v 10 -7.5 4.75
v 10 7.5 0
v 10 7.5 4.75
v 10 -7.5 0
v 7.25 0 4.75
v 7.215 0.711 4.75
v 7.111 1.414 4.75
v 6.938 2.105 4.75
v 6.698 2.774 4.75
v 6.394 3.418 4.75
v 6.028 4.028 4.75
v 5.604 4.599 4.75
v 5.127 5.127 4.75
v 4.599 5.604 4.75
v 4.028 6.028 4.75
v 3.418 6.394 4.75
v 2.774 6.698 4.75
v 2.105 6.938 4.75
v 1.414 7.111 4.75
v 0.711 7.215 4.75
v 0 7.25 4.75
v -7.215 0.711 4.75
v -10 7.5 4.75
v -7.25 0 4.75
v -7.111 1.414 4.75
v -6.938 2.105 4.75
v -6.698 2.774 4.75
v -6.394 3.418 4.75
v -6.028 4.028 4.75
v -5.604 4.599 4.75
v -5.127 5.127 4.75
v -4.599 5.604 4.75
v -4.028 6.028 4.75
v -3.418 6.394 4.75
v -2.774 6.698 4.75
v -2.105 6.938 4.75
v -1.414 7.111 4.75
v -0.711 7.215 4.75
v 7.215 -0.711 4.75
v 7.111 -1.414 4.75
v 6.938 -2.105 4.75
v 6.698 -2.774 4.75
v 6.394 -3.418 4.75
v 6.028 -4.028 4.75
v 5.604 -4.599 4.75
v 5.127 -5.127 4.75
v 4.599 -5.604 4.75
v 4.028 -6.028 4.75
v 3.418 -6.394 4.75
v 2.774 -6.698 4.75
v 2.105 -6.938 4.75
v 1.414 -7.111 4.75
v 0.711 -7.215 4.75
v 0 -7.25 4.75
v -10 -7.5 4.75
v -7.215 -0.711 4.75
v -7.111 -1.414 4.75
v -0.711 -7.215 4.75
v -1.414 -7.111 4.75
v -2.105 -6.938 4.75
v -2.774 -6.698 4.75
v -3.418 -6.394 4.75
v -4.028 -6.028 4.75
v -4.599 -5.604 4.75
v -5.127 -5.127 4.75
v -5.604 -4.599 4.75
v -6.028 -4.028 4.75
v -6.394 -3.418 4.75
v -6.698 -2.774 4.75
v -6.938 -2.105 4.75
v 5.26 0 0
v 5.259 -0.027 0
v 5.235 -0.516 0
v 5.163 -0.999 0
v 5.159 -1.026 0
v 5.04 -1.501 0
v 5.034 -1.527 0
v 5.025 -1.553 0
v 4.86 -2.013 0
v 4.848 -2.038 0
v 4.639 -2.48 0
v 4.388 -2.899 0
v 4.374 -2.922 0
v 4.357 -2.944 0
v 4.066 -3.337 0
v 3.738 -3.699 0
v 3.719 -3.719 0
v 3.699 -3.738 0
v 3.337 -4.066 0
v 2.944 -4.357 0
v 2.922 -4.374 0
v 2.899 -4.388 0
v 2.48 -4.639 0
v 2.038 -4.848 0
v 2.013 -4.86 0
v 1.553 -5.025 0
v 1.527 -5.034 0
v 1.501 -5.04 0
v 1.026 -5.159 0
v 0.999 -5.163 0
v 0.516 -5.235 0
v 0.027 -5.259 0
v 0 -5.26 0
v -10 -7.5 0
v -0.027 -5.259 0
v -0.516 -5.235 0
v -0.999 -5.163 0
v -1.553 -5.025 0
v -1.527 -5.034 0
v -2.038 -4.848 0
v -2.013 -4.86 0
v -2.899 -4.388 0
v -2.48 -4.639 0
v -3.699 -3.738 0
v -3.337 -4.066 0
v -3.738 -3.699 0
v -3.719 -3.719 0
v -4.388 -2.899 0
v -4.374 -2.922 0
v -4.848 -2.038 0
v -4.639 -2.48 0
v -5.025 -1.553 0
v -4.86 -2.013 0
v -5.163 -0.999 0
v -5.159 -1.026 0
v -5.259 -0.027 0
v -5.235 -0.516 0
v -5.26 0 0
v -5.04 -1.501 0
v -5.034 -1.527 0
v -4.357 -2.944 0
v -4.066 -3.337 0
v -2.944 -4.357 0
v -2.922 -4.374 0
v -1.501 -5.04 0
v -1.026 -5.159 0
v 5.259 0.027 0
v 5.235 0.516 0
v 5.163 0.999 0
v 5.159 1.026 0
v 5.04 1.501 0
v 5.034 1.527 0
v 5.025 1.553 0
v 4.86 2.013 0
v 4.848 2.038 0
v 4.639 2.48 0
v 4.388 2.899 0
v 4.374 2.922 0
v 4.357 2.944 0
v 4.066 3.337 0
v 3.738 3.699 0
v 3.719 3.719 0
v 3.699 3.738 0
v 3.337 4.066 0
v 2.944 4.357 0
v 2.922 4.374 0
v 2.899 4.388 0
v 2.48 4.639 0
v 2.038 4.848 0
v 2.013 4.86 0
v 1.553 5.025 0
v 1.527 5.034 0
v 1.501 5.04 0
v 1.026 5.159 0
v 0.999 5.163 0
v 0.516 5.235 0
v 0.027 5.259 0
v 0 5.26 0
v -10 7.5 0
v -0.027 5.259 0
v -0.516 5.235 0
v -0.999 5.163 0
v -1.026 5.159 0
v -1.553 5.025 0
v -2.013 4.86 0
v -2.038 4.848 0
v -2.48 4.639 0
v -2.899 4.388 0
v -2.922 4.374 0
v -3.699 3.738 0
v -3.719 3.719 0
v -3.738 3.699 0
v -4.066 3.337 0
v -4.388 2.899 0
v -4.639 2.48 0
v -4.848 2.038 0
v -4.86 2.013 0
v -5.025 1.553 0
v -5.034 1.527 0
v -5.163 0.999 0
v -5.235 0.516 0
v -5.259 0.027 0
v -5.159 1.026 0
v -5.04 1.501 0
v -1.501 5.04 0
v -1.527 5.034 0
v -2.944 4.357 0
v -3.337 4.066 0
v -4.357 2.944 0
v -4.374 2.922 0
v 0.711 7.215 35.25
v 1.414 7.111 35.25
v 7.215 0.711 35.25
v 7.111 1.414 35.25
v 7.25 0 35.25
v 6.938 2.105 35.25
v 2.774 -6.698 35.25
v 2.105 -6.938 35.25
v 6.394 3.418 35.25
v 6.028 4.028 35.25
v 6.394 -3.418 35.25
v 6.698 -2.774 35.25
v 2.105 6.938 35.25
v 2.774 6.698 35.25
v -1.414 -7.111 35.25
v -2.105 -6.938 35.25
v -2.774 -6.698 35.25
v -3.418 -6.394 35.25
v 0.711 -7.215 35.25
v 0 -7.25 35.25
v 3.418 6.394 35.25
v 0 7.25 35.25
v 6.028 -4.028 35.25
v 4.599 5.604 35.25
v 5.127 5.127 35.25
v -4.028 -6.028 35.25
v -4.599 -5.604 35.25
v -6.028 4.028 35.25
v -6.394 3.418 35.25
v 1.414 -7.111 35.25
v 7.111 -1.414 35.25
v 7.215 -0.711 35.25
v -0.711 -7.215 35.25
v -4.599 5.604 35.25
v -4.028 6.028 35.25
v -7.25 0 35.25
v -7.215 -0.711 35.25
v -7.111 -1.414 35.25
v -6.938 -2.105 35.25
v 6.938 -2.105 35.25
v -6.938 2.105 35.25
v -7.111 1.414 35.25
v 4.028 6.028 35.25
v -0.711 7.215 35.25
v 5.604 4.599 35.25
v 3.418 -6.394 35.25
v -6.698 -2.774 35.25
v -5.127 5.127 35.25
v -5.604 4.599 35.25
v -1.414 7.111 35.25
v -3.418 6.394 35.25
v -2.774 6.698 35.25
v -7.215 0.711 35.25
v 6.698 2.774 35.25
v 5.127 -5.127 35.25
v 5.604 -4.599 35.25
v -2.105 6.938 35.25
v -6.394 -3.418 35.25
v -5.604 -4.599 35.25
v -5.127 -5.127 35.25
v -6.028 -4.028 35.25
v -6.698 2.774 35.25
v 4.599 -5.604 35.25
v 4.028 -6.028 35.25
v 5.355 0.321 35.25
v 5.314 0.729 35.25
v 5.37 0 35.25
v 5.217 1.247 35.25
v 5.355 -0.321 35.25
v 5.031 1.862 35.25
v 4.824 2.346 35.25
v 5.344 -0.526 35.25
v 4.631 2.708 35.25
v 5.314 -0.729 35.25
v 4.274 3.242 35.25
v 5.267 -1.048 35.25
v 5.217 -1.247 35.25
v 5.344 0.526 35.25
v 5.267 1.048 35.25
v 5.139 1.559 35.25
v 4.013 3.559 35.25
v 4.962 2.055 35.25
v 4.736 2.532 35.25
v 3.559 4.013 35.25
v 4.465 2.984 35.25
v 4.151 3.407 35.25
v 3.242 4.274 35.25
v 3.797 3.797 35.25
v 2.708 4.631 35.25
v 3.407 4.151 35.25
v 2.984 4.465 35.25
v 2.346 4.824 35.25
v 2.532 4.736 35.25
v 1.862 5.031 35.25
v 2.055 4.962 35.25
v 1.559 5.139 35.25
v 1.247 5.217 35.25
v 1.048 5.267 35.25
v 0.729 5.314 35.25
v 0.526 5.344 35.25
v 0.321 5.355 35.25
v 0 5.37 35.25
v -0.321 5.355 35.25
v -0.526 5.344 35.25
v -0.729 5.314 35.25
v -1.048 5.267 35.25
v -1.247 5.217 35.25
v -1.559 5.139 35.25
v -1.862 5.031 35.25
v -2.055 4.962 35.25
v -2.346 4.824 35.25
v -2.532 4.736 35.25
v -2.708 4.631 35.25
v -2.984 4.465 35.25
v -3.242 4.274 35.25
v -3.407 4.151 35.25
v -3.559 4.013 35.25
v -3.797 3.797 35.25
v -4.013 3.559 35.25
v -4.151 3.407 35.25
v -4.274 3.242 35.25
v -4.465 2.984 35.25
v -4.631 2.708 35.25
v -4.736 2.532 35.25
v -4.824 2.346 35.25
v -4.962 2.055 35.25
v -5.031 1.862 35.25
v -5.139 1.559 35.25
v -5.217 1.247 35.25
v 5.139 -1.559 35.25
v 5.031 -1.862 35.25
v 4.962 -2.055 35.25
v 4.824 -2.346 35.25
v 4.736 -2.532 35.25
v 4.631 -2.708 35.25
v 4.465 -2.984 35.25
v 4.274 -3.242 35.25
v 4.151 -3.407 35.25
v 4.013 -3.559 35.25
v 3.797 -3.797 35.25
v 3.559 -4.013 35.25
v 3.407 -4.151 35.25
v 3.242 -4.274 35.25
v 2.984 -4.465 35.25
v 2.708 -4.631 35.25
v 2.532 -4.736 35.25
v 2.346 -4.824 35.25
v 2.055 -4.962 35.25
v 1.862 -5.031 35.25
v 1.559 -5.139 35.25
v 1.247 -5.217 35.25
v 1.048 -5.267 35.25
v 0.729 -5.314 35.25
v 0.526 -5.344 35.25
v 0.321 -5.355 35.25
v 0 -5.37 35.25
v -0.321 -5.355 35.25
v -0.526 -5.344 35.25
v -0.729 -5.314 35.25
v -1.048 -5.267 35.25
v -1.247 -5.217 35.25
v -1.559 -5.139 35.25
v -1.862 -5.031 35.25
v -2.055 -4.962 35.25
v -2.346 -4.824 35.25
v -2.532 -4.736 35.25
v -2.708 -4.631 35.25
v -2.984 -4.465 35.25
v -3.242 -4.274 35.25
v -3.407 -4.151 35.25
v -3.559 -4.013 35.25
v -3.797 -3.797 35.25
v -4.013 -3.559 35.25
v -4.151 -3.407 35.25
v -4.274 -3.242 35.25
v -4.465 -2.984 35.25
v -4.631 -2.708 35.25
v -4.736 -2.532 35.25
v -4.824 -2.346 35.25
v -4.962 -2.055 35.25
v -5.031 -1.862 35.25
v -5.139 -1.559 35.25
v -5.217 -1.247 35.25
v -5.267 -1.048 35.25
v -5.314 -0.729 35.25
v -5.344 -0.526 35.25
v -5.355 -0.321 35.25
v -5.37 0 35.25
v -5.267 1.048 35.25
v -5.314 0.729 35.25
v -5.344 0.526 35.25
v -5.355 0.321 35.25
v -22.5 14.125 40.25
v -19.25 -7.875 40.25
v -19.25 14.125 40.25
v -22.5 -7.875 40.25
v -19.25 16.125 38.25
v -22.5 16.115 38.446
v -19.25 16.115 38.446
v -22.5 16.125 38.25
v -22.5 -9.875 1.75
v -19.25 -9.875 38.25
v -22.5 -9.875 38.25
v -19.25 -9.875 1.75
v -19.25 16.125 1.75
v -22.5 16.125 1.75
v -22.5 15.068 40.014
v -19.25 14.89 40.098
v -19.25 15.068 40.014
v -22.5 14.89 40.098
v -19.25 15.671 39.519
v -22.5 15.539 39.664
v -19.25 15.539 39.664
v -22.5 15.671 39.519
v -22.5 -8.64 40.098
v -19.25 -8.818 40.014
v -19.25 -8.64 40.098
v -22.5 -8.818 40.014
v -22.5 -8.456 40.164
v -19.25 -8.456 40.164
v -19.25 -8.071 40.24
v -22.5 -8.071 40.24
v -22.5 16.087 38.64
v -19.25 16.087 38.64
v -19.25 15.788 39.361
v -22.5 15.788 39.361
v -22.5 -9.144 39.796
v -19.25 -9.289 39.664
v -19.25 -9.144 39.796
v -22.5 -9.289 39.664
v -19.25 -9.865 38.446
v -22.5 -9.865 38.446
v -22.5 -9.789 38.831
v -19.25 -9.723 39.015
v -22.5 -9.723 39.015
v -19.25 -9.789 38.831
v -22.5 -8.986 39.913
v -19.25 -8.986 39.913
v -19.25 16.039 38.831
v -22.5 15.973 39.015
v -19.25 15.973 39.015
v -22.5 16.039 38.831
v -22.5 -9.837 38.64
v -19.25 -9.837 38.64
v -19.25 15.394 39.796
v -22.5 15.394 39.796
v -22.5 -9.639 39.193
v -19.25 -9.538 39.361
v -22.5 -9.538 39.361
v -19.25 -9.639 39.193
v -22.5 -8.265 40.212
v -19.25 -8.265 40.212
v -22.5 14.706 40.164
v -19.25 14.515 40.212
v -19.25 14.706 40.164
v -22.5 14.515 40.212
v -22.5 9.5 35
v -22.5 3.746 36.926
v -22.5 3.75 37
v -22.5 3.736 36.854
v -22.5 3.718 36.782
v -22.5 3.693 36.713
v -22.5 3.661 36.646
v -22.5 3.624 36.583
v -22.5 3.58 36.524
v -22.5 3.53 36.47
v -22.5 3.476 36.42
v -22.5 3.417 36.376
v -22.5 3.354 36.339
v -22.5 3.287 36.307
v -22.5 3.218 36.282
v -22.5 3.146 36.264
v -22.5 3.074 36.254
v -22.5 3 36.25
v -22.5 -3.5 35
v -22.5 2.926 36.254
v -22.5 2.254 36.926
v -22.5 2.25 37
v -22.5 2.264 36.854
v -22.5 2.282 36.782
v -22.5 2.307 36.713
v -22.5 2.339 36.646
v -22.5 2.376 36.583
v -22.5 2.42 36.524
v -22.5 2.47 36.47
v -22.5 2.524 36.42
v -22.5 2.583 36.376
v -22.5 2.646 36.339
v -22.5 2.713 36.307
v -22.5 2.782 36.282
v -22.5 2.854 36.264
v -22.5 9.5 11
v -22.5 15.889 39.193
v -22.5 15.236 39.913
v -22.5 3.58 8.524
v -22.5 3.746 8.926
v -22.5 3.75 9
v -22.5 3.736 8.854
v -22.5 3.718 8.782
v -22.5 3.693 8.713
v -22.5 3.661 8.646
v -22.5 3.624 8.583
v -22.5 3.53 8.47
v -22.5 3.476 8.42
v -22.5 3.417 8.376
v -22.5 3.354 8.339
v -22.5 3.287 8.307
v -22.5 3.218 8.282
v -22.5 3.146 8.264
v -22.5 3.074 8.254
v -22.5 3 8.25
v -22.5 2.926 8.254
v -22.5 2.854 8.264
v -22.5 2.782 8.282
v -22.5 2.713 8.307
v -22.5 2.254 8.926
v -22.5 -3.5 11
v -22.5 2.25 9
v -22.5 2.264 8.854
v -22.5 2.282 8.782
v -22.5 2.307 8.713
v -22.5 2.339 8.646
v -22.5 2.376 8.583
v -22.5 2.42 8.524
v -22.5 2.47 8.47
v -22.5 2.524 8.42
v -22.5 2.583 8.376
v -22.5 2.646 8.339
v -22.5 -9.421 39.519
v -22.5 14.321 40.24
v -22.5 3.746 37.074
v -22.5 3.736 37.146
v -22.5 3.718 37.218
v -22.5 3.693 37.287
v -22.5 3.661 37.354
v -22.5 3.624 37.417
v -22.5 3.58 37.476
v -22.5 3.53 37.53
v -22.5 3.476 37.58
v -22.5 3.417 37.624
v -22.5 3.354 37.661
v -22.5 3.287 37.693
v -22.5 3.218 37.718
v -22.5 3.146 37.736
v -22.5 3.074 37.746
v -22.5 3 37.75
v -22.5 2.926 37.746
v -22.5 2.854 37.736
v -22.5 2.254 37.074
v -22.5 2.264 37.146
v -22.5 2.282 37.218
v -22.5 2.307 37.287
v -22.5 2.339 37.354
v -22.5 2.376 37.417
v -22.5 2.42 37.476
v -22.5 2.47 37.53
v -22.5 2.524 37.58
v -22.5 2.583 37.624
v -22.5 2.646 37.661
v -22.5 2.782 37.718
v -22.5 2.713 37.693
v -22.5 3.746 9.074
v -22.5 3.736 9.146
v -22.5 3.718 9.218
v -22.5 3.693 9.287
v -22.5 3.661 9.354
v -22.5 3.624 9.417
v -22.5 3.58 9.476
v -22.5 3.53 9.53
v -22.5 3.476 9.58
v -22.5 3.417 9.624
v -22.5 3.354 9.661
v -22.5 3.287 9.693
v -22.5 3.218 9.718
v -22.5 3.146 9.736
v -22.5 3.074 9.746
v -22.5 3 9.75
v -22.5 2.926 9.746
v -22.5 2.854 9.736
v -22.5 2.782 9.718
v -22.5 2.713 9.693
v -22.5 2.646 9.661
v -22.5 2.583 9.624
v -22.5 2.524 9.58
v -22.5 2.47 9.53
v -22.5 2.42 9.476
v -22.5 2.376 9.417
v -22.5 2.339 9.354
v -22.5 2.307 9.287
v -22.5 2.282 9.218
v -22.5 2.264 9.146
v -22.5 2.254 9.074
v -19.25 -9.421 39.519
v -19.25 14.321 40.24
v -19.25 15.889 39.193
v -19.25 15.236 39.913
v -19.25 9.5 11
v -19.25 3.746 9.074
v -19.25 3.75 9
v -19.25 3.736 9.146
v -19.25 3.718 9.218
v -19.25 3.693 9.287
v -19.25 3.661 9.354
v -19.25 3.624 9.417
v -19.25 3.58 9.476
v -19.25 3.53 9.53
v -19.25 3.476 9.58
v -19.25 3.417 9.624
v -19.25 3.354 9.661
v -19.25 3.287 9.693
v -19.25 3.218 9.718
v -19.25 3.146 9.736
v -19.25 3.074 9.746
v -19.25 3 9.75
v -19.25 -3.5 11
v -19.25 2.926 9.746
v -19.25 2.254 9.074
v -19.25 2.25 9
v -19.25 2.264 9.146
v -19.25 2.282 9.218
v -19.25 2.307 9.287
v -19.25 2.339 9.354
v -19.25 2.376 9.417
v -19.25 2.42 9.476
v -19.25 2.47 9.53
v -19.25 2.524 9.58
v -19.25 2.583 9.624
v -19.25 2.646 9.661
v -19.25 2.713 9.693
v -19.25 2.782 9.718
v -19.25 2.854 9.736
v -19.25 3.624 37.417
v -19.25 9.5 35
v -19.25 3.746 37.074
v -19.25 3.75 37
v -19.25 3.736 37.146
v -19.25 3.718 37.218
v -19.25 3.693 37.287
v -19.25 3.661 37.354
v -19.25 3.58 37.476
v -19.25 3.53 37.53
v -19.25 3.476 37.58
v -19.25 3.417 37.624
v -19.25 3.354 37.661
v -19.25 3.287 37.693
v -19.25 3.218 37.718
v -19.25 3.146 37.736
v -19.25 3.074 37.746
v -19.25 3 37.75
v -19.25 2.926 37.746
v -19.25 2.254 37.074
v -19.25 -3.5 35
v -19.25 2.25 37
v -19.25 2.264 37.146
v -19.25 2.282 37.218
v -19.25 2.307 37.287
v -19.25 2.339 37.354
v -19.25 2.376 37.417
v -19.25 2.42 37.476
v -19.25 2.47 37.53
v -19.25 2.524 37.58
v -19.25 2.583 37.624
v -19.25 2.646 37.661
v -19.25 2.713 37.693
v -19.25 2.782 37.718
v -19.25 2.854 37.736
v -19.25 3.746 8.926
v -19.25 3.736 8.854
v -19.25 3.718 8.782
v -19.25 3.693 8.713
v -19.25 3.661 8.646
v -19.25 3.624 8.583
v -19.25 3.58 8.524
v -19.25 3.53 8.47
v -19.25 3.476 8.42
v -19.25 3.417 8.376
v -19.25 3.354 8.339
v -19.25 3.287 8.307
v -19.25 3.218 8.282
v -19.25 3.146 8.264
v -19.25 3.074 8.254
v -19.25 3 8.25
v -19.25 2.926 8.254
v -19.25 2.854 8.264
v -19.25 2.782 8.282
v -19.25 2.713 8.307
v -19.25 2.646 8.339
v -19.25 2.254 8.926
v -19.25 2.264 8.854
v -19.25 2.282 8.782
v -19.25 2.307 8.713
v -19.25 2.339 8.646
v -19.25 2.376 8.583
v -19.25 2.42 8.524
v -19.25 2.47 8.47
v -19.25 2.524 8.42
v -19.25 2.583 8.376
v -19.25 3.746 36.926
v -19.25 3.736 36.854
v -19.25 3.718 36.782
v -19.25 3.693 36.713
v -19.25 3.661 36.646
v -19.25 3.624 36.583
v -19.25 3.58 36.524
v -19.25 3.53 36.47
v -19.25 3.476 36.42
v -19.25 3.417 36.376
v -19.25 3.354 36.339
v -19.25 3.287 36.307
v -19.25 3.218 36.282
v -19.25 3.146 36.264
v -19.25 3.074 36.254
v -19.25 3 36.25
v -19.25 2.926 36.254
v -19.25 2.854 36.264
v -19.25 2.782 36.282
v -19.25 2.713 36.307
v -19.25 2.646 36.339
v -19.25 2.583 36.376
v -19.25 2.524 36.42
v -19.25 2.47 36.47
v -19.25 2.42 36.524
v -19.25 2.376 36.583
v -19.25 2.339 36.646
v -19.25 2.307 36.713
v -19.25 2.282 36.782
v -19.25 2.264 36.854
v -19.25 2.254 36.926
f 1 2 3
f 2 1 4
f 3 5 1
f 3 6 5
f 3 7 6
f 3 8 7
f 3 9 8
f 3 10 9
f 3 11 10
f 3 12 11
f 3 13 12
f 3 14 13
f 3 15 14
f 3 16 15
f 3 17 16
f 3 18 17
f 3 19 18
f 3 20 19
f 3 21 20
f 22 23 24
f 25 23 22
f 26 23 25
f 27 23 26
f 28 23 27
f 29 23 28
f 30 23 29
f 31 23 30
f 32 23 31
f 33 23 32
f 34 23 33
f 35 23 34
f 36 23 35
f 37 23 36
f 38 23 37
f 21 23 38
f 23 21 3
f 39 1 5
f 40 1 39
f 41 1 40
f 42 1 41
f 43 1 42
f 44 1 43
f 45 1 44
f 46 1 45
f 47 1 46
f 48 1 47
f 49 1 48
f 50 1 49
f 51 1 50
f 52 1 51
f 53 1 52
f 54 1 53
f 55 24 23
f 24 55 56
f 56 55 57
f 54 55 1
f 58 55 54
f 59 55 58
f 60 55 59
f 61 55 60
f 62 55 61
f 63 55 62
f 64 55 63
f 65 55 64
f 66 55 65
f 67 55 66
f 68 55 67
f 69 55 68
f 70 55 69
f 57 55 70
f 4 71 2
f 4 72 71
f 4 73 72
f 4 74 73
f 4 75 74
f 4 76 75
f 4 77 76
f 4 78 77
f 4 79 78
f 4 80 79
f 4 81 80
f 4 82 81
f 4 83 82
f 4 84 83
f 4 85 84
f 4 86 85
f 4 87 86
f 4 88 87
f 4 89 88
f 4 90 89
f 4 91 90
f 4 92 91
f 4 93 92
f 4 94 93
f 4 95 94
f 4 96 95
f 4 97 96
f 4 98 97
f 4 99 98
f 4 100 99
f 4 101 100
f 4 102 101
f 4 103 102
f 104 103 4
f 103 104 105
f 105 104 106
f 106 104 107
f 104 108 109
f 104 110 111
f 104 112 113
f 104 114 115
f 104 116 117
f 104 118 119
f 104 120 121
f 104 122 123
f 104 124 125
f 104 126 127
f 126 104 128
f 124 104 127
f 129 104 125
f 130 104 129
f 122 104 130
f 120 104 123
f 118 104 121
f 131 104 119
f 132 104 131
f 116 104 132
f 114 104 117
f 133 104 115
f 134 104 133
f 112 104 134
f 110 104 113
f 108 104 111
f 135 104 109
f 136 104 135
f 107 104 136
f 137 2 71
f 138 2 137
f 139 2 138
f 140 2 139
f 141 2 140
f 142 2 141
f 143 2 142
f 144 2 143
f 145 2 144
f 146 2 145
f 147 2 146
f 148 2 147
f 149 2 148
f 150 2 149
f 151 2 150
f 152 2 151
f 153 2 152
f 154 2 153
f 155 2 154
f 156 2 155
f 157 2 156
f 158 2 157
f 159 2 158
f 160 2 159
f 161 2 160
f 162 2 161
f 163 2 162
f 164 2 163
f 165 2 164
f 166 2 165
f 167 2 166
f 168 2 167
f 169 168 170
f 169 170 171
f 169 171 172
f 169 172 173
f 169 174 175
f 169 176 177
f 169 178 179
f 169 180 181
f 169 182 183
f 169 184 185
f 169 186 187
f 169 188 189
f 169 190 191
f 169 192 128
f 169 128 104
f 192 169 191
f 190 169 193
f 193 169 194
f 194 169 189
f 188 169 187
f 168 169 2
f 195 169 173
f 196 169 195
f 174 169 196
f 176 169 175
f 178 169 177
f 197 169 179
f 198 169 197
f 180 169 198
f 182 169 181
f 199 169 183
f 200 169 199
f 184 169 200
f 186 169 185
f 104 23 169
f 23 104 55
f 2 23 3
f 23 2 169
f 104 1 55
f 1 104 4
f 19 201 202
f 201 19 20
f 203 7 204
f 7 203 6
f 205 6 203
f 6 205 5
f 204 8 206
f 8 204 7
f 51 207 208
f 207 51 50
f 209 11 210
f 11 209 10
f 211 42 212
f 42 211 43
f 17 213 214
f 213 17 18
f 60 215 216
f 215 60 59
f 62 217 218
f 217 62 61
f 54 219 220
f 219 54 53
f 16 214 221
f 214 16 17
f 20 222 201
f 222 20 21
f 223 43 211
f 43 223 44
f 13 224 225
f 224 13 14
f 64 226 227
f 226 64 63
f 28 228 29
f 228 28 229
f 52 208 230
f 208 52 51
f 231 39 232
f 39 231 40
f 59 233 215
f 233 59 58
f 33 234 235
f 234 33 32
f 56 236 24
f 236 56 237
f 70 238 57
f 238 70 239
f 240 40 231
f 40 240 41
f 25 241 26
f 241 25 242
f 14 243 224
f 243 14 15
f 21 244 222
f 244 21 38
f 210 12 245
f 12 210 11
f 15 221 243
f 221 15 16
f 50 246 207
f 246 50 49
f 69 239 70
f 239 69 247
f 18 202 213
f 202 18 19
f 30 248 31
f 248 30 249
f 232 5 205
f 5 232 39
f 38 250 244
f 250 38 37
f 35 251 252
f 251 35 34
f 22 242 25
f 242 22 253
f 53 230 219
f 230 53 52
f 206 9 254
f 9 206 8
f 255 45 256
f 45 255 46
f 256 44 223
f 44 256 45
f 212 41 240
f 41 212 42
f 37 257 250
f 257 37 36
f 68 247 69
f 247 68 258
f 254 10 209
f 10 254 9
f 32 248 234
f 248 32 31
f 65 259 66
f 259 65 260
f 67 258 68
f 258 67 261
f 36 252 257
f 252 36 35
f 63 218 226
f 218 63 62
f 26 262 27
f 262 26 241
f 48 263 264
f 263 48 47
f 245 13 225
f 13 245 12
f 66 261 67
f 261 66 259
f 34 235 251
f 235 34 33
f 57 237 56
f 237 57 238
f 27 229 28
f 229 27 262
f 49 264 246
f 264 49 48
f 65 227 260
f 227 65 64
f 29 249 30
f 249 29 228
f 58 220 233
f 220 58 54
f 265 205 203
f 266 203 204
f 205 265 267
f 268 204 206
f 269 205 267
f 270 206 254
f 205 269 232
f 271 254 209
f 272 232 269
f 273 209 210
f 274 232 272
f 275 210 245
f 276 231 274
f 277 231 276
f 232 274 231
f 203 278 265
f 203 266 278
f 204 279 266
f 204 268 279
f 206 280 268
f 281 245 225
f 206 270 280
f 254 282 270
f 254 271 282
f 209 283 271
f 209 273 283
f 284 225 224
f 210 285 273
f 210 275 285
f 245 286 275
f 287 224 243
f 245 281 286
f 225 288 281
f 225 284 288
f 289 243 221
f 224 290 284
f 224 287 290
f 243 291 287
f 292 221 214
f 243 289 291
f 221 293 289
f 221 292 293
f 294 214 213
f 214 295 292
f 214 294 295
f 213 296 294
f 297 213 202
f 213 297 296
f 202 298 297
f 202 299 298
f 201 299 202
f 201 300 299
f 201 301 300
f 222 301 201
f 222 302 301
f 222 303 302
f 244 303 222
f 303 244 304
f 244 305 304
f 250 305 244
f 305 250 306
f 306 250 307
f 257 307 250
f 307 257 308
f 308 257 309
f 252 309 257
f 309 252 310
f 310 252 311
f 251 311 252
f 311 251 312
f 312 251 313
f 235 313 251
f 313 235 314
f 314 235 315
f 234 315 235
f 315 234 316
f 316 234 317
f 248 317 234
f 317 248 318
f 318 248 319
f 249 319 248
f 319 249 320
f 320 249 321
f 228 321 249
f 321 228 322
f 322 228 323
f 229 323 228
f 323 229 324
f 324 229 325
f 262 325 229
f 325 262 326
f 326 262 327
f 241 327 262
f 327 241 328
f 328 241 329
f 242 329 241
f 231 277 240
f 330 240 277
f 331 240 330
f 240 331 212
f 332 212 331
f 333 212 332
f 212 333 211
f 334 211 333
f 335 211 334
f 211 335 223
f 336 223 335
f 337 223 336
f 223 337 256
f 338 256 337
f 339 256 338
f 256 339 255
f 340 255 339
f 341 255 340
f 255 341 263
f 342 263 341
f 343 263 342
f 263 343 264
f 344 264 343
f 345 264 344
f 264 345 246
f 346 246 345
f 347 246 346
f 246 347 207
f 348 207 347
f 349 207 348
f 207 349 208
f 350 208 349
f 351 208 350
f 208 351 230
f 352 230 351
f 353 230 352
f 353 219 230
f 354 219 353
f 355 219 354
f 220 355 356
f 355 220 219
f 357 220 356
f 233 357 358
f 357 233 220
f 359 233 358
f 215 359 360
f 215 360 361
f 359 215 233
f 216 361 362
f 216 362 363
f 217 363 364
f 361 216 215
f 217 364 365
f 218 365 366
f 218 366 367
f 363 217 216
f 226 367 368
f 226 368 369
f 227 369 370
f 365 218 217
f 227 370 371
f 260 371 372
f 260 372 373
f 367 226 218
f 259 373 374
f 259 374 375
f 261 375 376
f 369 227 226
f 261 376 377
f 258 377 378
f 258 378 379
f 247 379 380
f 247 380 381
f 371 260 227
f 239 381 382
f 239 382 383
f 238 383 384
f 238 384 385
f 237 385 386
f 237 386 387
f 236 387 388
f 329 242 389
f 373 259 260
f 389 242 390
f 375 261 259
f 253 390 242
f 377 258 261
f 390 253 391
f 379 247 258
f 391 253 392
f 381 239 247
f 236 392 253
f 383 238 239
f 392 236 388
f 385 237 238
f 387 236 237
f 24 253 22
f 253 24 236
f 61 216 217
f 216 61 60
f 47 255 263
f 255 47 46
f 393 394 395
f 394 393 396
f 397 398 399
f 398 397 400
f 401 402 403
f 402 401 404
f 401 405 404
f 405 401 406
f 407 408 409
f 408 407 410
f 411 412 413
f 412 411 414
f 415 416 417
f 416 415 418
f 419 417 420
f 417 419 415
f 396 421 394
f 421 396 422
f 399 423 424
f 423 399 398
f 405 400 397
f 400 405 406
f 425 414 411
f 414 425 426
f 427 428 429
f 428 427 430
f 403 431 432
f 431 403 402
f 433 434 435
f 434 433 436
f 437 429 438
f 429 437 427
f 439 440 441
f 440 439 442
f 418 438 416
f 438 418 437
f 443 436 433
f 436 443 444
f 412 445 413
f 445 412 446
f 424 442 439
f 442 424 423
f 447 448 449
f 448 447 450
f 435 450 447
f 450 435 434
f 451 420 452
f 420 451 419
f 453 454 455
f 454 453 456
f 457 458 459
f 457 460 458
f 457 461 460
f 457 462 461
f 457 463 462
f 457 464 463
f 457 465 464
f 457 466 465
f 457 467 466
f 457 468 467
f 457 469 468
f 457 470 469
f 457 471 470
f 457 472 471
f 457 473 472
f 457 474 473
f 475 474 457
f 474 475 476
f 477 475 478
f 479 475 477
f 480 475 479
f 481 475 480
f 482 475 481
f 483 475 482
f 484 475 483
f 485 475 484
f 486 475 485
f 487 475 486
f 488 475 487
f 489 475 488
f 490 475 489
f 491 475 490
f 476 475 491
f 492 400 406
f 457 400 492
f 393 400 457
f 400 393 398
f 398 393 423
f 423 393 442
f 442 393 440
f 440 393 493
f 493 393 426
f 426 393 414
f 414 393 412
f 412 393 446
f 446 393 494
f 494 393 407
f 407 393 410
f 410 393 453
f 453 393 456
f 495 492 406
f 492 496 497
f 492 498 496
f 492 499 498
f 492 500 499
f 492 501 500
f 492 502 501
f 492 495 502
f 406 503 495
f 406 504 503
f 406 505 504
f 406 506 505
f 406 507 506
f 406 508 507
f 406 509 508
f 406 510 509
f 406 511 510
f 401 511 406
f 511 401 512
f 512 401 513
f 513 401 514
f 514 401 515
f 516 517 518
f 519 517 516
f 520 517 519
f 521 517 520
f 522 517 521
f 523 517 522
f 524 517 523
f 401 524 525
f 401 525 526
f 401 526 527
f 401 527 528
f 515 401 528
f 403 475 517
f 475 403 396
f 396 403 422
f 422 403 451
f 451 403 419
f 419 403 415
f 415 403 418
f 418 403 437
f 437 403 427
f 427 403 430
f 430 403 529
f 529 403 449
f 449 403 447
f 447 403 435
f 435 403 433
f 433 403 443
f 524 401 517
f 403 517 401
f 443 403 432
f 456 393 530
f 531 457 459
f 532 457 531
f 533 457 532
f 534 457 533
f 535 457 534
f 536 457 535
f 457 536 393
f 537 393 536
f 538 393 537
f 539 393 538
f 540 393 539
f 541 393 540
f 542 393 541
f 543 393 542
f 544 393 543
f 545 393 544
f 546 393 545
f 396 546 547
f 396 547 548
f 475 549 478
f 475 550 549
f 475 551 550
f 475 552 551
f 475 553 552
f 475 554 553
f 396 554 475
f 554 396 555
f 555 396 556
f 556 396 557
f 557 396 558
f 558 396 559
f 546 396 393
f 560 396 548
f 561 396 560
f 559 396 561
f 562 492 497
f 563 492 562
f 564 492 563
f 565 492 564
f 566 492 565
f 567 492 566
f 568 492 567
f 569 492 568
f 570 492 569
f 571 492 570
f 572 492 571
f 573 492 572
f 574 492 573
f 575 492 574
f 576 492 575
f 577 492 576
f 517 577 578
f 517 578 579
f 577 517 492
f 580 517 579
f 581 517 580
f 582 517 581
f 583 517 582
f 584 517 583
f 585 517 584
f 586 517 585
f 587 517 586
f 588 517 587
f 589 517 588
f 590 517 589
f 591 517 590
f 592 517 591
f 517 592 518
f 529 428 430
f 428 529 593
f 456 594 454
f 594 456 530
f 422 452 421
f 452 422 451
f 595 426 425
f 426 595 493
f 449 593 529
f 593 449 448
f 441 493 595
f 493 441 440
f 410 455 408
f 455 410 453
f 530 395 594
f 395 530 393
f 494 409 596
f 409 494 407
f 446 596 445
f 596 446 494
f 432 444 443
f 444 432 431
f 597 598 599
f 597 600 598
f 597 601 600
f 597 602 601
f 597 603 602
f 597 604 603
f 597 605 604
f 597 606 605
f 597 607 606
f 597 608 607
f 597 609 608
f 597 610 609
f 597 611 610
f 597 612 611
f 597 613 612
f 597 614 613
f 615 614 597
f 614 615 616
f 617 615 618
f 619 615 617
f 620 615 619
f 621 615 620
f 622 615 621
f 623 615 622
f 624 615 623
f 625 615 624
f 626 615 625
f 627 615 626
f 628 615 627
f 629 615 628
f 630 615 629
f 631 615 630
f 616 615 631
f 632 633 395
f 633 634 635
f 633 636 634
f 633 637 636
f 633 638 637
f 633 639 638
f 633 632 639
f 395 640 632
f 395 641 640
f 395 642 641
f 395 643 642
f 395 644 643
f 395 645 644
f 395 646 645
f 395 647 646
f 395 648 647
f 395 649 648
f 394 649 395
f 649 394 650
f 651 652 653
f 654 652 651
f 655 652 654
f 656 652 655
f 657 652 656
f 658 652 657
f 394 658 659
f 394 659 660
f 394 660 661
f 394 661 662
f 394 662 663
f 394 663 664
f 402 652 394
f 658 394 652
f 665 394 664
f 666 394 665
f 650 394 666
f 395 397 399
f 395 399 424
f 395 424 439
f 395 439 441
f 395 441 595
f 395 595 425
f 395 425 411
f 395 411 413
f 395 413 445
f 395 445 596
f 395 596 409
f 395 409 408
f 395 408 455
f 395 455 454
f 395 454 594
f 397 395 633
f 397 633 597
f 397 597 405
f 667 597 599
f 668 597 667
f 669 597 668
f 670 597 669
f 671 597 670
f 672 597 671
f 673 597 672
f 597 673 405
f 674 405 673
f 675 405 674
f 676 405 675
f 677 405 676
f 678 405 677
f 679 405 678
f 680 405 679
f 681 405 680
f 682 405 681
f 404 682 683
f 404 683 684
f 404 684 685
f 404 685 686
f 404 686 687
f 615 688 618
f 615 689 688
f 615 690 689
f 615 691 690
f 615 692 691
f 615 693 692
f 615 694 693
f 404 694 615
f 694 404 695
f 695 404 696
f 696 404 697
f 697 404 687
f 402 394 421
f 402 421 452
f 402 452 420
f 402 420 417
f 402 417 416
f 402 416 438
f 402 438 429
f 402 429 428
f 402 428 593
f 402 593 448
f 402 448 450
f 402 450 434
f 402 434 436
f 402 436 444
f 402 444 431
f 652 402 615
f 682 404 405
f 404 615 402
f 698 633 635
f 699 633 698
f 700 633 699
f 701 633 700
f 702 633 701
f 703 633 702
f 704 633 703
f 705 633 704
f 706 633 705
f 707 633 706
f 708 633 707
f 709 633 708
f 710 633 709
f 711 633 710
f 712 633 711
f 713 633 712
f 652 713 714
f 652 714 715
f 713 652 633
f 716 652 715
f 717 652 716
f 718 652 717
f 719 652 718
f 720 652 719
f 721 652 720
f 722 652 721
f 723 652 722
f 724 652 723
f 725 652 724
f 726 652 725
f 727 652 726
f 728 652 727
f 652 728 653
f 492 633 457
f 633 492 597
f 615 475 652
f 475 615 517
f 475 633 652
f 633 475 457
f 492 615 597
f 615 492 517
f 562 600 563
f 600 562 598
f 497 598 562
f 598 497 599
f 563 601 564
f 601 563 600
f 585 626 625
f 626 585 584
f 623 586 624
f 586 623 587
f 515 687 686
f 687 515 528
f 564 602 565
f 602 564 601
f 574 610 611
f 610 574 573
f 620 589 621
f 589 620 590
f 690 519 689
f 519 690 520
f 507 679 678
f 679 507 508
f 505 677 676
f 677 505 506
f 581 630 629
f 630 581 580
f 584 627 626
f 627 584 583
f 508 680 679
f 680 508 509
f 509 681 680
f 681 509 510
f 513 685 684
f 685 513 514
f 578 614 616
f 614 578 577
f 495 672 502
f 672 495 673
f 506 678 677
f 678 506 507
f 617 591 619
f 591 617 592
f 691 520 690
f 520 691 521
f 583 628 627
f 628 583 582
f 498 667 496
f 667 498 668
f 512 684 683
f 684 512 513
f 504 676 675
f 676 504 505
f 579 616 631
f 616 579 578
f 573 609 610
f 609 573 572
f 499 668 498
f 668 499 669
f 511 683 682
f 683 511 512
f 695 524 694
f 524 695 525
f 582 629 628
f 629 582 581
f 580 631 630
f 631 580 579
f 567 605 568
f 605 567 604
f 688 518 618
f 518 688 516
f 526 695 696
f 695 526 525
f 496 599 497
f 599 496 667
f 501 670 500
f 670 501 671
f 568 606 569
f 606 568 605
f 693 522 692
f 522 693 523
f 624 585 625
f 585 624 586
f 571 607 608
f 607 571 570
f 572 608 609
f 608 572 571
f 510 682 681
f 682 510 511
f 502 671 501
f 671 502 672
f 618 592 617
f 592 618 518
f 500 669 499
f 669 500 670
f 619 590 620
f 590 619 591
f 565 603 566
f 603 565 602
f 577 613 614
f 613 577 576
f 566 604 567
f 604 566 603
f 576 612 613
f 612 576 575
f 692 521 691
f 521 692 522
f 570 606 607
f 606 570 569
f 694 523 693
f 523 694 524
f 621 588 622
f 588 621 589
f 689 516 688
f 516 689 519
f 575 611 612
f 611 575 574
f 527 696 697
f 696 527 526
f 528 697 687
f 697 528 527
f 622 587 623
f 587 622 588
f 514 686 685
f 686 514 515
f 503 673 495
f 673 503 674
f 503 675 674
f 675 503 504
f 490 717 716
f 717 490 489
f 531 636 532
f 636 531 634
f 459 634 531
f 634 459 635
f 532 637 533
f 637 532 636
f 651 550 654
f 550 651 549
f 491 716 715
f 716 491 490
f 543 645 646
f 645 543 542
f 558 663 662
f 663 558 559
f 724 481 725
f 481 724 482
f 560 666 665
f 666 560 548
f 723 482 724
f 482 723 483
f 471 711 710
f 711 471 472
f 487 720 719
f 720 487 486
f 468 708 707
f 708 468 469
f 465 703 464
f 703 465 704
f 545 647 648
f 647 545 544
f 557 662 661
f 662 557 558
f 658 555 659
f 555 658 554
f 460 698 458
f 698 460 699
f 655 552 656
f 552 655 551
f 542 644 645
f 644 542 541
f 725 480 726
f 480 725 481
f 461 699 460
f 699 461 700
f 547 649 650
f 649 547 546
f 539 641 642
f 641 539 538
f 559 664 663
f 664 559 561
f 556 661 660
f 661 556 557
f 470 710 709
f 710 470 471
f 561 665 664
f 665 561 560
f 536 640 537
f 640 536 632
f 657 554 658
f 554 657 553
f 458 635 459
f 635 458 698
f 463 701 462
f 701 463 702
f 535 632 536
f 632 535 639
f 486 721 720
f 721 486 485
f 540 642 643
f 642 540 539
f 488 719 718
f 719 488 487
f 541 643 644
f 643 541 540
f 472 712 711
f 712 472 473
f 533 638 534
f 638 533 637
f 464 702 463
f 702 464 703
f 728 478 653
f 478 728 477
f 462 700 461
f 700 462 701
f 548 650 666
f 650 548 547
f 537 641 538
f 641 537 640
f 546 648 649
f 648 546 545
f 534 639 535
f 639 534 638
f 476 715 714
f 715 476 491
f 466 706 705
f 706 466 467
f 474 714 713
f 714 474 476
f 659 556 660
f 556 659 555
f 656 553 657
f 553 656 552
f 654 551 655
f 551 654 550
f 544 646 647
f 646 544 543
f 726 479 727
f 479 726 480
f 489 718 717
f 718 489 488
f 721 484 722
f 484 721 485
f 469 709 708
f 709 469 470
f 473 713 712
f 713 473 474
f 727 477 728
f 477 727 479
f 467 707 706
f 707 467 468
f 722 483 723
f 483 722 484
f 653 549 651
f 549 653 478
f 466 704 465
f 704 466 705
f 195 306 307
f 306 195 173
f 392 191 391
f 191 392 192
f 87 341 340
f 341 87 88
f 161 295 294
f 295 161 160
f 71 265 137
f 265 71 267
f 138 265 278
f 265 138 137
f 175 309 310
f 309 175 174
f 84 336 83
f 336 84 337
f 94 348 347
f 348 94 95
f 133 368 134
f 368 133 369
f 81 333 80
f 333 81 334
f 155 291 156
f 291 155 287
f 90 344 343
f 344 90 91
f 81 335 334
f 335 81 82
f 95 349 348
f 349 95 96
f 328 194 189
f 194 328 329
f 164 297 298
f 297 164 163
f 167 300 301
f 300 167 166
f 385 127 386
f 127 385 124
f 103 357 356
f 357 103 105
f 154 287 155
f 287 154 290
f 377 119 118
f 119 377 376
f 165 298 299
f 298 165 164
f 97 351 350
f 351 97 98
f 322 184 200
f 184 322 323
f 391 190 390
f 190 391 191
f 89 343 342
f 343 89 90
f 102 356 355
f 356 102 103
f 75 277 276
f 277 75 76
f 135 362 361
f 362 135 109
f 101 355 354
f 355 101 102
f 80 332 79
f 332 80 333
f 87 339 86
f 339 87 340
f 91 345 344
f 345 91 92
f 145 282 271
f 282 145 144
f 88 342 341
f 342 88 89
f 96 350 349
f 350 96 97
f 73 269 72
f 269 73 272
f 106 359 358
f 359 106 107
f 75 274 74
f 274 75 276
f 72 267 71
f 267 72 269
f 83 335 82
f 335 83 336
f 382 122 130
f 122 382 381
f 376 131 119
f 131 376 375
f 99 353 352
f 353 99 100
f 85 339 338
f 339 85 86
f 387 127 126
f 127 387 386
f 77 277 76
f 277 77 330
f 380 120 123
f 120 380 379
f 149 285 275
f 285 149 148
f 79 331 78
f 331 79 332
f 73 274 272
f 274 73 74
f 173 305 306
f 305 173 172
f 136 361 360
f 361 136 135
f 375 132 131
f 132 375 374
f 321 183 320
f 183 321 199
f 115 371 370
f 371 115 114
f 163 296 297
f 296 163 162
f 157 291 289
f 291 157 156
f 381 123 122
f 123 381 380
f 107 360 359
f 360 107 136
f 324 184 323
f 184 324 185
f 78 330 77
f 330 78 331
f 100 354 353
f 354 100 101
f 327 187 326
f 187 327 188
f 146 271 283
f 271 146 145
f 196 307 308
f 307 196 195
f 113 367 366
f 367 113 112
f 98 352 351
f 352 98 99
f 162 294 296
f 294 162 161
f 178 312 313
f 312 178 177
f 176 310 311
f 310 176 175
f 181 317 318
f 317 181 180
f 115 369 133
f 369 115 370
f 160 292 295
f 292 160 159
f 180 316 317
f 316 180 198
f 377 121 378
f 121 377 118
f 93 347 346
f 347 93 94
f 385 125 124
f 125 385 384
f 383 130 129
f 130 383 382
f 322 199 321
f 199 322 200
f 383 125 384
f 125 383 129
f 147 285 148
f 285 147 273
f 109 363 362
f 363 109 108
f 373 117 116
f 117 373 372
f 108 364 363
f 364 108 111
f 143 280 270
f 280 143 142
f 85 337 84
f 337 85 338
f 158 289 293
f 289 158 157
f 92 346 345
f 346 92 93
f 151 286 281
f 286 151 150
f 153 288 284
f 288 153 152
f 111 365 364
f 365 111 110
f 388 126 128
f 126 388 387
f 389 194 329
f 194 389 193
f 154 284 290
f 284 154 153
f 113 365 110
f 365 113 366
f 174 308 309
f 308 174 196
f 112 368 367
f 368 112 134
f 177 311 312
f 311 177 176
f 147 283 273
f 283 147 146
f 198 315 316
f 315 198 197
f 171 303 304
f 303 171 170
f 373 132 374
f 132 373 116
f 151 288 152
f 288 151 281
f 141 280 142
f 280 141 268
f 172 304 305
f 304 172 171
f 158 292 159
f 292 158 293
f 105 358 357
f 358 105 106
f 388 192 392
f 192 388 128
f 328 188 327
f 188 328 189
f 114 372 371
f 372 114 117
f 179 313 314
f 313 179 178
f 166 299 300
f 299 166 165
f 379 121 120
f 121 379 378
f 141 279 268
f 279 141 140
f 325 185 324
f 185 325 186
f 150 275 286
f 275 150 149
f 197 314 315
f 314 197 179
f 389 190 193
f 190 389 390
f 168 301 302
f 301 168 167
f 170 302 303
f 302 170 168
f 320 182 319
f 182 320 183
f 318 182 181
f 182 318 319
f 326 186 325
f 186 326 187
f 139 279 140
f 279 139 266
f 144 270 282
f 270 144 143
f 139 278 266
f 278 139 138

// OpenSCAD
// pen holder for plotting robot




// Diameter of pen in mm.
penDiameter = 10.5;  // 10.60

union();

$fn = 64;

barrelDiameter = 15; // don't change or M3 holes shift

penRadius = penDiameter / 2;
barrelHieght = 24 + 8;
barrelWallThickness = 2;
baseThickness = 3.25;
cornerRounding = 2;
M3holeDia = 3.5;
M3nutDia = 6.6;
holeOffset = M3holeDia * 1.2;
baseLen = 15;
//baseWid = penDiameter + 2 * barrelWallThickness + 2;
baseWid = 20;
echo(baseWid);
echo(baseLen);


// servo bracket variables
servoOveralHeight = 34.5;  // 34.5 
servoBodyHeight = 24;
servoBodyWidth = 13;
servoScrewDia = 1.5;
servoScrewOffset = 2;
servoHeightOffset = 23; //barrelHieght - 5;
servoFwdOffset = penRadius + barrelWallThickness + baseThickness + 12;



difference(){
	union(){
		penHolder();
		servoBracket();
	}
    // re-drill the hole covered by servoBracket
	translate([0, 0, -baseThickness])
	cylinder(2 * barrelHieght, penRadius, penRadius+0.2);

    translate([-40, -40, -40])
    cube([80, 80, 40]);

    rotate([0, 0, 0])
    union(){
		
		// pen hole
		//
    }
}	


module roundedCube(xdim ,ydim ,zdim, rdim){
	hull(){ // https://youtu.be/gKOkJWiTgAY
		translate([rdim, rdim, 0]) cylinder(zdim, rdim, rdim);
		translate([xdim-rdim, rdim, 0]) cylinder(zdim, rdim, rdim);
		translate([rdim, ydim-rdim, 0]) cylinder(zdim, rdim, rdim);
		translate([xdim-rdim, ydim-rdim, 0]) cylinder(zdim, rdim, rdim);
	}
}


module halfRoundedCube(xdim ,ydim ,zdim, rdim){
	hull(){ // only round two sides
		translate([0, rdim, 0]) cube([2, rdim * 2, zdim]);
		translate([xdim-rdim, rdim, 0]) cube([rdim, rdim * 2, zdim]);
		translate([rdim, ydim-rdim, 0]) cylinder(zdim, rdim, rdim);
		translate([xdim-rdim, ydim-rdim, 0]) cylinder(zdim, rdim, rdim);
	}
}


module halfRoundedCube2(xdim ,ydim ,zdim, rdim){
	hull(){ // https://youtu.be/gKOkJWiTgAY
		translate([rdim, rdim, 0]) cylinder(zdim, rdim, rdim);
		translate([xdim-rdim, 0, 0]) cube([rdim, rdim * 2, zdim ]);
		translate([rdim, ydim-rdim, 0]) cylinder(zdim, rdim, rdim);
		translate([xdim-rdim, ydim-rdim, 0]) cube([zdim, rdim, rdim]);
	}
}


module halfRoundedCube3(xdim ,ydim ,zdim, rdim){
	hull(){ // https://youtu.be/gKOkJWiTgAY
		translate([rdim, rdim, 0]) cylinder(zdim, rdim, rdim);
		translate([xdim-rdim, rdim, 0]) cylinder(zdim, rdim, rdim);
		translate([0, ydim-rdim, 0]) cube([zdim, rdim, rdim]);
		translate([xdim-rdim, ydim-rdim, 0]) cube([zdim, rdim, rdim + 1]);
	}
}



module penHolder(){
	// base plate
    rotate([0, 0, 0])
	difference(){
		translate([	-baseWid / 2, -baseLen / 2, 0])

		// base piece
		//roundedCube(baseWid, baseLen, baseThickness, cornerRounding);
        cube([baseWid, baseLen, baseThickness + 1.5]);

		// pen hole
		//cylinder(baseThickness, penRadius, penRadius);
    };


	// pen barrel
	translate([0, 0, baseThickness])
	difference(){
		// barrel
		cylinder(	barrelHieght, 
					penRadius + barrelWallThickness, 
					penRadius + barrelWallThickness );
		// bore
		//cylinder(barrelHieght, penRadius, penRadius + 0.25);	
	}
}


module servoBracket(){
	// servo bracket face
	//rotate([0, 90, 90]) // (z, z, x) now
	//translate([	-servoHeightOffset, 0, servoFwdOffset])
    translate([-servoFwdOffset, 3, servoHeightOffset])
    rotate([90, 0, 90])

 
	difference(){
		// base 

		union(){

            
			translate([-(   servoBodyWidth + 3 * baseThickness) / 2 -1.5,
						 	-servoOveralHeight / 2 - 6, 0])
			halfRoundedCube(servoBodyWidth + 4 * baseThickness,
							servoOveralHeight + 6, 
                            baseThickness, cornerRounding);         
		}
        
        // cut off underneath
        //translate([-50, -50, -100])
        //cube([100, 100, 100]);
        
        // base holes
		translate([ -(servoBodyWidth + 2 * baseThickness) / 2 + M3holeDia,
					-servoOveralHeight / 2 + 1, 10 / 1.5])
		rotate([90, 0, 0])
		cylinder(baseThickness + 2, d=M3holeDia, d=M3holeDia);

		// body cutout
		translate([-servoBodyWidth / 2, -servoBodyHeight / 2, 0])
		cube([servoBodyWidth, servoBodyHeight , baseThickness + 1]);

		//translate([-servoBodyWidth / 2, 0.6, 0])
		//cube([servoBodyWidth, servoBodyHeight / 2 - 0.6, baseThickness + 1]);

		// vertical screw holes
		translate([0, -servoBodyHeight / 2 - servoScrewOffset, 0])
		cylinder(baseThickness + 1, servoScrewDia / 2, servoScrewDia / 2);
		translate([0, servoBodyHeight / 2 + servoScrewOffset, 0])
		cylinder(baseThickness + 1, servoScrewDia / 2, servoScrewDia / 2);
        

	}


}
